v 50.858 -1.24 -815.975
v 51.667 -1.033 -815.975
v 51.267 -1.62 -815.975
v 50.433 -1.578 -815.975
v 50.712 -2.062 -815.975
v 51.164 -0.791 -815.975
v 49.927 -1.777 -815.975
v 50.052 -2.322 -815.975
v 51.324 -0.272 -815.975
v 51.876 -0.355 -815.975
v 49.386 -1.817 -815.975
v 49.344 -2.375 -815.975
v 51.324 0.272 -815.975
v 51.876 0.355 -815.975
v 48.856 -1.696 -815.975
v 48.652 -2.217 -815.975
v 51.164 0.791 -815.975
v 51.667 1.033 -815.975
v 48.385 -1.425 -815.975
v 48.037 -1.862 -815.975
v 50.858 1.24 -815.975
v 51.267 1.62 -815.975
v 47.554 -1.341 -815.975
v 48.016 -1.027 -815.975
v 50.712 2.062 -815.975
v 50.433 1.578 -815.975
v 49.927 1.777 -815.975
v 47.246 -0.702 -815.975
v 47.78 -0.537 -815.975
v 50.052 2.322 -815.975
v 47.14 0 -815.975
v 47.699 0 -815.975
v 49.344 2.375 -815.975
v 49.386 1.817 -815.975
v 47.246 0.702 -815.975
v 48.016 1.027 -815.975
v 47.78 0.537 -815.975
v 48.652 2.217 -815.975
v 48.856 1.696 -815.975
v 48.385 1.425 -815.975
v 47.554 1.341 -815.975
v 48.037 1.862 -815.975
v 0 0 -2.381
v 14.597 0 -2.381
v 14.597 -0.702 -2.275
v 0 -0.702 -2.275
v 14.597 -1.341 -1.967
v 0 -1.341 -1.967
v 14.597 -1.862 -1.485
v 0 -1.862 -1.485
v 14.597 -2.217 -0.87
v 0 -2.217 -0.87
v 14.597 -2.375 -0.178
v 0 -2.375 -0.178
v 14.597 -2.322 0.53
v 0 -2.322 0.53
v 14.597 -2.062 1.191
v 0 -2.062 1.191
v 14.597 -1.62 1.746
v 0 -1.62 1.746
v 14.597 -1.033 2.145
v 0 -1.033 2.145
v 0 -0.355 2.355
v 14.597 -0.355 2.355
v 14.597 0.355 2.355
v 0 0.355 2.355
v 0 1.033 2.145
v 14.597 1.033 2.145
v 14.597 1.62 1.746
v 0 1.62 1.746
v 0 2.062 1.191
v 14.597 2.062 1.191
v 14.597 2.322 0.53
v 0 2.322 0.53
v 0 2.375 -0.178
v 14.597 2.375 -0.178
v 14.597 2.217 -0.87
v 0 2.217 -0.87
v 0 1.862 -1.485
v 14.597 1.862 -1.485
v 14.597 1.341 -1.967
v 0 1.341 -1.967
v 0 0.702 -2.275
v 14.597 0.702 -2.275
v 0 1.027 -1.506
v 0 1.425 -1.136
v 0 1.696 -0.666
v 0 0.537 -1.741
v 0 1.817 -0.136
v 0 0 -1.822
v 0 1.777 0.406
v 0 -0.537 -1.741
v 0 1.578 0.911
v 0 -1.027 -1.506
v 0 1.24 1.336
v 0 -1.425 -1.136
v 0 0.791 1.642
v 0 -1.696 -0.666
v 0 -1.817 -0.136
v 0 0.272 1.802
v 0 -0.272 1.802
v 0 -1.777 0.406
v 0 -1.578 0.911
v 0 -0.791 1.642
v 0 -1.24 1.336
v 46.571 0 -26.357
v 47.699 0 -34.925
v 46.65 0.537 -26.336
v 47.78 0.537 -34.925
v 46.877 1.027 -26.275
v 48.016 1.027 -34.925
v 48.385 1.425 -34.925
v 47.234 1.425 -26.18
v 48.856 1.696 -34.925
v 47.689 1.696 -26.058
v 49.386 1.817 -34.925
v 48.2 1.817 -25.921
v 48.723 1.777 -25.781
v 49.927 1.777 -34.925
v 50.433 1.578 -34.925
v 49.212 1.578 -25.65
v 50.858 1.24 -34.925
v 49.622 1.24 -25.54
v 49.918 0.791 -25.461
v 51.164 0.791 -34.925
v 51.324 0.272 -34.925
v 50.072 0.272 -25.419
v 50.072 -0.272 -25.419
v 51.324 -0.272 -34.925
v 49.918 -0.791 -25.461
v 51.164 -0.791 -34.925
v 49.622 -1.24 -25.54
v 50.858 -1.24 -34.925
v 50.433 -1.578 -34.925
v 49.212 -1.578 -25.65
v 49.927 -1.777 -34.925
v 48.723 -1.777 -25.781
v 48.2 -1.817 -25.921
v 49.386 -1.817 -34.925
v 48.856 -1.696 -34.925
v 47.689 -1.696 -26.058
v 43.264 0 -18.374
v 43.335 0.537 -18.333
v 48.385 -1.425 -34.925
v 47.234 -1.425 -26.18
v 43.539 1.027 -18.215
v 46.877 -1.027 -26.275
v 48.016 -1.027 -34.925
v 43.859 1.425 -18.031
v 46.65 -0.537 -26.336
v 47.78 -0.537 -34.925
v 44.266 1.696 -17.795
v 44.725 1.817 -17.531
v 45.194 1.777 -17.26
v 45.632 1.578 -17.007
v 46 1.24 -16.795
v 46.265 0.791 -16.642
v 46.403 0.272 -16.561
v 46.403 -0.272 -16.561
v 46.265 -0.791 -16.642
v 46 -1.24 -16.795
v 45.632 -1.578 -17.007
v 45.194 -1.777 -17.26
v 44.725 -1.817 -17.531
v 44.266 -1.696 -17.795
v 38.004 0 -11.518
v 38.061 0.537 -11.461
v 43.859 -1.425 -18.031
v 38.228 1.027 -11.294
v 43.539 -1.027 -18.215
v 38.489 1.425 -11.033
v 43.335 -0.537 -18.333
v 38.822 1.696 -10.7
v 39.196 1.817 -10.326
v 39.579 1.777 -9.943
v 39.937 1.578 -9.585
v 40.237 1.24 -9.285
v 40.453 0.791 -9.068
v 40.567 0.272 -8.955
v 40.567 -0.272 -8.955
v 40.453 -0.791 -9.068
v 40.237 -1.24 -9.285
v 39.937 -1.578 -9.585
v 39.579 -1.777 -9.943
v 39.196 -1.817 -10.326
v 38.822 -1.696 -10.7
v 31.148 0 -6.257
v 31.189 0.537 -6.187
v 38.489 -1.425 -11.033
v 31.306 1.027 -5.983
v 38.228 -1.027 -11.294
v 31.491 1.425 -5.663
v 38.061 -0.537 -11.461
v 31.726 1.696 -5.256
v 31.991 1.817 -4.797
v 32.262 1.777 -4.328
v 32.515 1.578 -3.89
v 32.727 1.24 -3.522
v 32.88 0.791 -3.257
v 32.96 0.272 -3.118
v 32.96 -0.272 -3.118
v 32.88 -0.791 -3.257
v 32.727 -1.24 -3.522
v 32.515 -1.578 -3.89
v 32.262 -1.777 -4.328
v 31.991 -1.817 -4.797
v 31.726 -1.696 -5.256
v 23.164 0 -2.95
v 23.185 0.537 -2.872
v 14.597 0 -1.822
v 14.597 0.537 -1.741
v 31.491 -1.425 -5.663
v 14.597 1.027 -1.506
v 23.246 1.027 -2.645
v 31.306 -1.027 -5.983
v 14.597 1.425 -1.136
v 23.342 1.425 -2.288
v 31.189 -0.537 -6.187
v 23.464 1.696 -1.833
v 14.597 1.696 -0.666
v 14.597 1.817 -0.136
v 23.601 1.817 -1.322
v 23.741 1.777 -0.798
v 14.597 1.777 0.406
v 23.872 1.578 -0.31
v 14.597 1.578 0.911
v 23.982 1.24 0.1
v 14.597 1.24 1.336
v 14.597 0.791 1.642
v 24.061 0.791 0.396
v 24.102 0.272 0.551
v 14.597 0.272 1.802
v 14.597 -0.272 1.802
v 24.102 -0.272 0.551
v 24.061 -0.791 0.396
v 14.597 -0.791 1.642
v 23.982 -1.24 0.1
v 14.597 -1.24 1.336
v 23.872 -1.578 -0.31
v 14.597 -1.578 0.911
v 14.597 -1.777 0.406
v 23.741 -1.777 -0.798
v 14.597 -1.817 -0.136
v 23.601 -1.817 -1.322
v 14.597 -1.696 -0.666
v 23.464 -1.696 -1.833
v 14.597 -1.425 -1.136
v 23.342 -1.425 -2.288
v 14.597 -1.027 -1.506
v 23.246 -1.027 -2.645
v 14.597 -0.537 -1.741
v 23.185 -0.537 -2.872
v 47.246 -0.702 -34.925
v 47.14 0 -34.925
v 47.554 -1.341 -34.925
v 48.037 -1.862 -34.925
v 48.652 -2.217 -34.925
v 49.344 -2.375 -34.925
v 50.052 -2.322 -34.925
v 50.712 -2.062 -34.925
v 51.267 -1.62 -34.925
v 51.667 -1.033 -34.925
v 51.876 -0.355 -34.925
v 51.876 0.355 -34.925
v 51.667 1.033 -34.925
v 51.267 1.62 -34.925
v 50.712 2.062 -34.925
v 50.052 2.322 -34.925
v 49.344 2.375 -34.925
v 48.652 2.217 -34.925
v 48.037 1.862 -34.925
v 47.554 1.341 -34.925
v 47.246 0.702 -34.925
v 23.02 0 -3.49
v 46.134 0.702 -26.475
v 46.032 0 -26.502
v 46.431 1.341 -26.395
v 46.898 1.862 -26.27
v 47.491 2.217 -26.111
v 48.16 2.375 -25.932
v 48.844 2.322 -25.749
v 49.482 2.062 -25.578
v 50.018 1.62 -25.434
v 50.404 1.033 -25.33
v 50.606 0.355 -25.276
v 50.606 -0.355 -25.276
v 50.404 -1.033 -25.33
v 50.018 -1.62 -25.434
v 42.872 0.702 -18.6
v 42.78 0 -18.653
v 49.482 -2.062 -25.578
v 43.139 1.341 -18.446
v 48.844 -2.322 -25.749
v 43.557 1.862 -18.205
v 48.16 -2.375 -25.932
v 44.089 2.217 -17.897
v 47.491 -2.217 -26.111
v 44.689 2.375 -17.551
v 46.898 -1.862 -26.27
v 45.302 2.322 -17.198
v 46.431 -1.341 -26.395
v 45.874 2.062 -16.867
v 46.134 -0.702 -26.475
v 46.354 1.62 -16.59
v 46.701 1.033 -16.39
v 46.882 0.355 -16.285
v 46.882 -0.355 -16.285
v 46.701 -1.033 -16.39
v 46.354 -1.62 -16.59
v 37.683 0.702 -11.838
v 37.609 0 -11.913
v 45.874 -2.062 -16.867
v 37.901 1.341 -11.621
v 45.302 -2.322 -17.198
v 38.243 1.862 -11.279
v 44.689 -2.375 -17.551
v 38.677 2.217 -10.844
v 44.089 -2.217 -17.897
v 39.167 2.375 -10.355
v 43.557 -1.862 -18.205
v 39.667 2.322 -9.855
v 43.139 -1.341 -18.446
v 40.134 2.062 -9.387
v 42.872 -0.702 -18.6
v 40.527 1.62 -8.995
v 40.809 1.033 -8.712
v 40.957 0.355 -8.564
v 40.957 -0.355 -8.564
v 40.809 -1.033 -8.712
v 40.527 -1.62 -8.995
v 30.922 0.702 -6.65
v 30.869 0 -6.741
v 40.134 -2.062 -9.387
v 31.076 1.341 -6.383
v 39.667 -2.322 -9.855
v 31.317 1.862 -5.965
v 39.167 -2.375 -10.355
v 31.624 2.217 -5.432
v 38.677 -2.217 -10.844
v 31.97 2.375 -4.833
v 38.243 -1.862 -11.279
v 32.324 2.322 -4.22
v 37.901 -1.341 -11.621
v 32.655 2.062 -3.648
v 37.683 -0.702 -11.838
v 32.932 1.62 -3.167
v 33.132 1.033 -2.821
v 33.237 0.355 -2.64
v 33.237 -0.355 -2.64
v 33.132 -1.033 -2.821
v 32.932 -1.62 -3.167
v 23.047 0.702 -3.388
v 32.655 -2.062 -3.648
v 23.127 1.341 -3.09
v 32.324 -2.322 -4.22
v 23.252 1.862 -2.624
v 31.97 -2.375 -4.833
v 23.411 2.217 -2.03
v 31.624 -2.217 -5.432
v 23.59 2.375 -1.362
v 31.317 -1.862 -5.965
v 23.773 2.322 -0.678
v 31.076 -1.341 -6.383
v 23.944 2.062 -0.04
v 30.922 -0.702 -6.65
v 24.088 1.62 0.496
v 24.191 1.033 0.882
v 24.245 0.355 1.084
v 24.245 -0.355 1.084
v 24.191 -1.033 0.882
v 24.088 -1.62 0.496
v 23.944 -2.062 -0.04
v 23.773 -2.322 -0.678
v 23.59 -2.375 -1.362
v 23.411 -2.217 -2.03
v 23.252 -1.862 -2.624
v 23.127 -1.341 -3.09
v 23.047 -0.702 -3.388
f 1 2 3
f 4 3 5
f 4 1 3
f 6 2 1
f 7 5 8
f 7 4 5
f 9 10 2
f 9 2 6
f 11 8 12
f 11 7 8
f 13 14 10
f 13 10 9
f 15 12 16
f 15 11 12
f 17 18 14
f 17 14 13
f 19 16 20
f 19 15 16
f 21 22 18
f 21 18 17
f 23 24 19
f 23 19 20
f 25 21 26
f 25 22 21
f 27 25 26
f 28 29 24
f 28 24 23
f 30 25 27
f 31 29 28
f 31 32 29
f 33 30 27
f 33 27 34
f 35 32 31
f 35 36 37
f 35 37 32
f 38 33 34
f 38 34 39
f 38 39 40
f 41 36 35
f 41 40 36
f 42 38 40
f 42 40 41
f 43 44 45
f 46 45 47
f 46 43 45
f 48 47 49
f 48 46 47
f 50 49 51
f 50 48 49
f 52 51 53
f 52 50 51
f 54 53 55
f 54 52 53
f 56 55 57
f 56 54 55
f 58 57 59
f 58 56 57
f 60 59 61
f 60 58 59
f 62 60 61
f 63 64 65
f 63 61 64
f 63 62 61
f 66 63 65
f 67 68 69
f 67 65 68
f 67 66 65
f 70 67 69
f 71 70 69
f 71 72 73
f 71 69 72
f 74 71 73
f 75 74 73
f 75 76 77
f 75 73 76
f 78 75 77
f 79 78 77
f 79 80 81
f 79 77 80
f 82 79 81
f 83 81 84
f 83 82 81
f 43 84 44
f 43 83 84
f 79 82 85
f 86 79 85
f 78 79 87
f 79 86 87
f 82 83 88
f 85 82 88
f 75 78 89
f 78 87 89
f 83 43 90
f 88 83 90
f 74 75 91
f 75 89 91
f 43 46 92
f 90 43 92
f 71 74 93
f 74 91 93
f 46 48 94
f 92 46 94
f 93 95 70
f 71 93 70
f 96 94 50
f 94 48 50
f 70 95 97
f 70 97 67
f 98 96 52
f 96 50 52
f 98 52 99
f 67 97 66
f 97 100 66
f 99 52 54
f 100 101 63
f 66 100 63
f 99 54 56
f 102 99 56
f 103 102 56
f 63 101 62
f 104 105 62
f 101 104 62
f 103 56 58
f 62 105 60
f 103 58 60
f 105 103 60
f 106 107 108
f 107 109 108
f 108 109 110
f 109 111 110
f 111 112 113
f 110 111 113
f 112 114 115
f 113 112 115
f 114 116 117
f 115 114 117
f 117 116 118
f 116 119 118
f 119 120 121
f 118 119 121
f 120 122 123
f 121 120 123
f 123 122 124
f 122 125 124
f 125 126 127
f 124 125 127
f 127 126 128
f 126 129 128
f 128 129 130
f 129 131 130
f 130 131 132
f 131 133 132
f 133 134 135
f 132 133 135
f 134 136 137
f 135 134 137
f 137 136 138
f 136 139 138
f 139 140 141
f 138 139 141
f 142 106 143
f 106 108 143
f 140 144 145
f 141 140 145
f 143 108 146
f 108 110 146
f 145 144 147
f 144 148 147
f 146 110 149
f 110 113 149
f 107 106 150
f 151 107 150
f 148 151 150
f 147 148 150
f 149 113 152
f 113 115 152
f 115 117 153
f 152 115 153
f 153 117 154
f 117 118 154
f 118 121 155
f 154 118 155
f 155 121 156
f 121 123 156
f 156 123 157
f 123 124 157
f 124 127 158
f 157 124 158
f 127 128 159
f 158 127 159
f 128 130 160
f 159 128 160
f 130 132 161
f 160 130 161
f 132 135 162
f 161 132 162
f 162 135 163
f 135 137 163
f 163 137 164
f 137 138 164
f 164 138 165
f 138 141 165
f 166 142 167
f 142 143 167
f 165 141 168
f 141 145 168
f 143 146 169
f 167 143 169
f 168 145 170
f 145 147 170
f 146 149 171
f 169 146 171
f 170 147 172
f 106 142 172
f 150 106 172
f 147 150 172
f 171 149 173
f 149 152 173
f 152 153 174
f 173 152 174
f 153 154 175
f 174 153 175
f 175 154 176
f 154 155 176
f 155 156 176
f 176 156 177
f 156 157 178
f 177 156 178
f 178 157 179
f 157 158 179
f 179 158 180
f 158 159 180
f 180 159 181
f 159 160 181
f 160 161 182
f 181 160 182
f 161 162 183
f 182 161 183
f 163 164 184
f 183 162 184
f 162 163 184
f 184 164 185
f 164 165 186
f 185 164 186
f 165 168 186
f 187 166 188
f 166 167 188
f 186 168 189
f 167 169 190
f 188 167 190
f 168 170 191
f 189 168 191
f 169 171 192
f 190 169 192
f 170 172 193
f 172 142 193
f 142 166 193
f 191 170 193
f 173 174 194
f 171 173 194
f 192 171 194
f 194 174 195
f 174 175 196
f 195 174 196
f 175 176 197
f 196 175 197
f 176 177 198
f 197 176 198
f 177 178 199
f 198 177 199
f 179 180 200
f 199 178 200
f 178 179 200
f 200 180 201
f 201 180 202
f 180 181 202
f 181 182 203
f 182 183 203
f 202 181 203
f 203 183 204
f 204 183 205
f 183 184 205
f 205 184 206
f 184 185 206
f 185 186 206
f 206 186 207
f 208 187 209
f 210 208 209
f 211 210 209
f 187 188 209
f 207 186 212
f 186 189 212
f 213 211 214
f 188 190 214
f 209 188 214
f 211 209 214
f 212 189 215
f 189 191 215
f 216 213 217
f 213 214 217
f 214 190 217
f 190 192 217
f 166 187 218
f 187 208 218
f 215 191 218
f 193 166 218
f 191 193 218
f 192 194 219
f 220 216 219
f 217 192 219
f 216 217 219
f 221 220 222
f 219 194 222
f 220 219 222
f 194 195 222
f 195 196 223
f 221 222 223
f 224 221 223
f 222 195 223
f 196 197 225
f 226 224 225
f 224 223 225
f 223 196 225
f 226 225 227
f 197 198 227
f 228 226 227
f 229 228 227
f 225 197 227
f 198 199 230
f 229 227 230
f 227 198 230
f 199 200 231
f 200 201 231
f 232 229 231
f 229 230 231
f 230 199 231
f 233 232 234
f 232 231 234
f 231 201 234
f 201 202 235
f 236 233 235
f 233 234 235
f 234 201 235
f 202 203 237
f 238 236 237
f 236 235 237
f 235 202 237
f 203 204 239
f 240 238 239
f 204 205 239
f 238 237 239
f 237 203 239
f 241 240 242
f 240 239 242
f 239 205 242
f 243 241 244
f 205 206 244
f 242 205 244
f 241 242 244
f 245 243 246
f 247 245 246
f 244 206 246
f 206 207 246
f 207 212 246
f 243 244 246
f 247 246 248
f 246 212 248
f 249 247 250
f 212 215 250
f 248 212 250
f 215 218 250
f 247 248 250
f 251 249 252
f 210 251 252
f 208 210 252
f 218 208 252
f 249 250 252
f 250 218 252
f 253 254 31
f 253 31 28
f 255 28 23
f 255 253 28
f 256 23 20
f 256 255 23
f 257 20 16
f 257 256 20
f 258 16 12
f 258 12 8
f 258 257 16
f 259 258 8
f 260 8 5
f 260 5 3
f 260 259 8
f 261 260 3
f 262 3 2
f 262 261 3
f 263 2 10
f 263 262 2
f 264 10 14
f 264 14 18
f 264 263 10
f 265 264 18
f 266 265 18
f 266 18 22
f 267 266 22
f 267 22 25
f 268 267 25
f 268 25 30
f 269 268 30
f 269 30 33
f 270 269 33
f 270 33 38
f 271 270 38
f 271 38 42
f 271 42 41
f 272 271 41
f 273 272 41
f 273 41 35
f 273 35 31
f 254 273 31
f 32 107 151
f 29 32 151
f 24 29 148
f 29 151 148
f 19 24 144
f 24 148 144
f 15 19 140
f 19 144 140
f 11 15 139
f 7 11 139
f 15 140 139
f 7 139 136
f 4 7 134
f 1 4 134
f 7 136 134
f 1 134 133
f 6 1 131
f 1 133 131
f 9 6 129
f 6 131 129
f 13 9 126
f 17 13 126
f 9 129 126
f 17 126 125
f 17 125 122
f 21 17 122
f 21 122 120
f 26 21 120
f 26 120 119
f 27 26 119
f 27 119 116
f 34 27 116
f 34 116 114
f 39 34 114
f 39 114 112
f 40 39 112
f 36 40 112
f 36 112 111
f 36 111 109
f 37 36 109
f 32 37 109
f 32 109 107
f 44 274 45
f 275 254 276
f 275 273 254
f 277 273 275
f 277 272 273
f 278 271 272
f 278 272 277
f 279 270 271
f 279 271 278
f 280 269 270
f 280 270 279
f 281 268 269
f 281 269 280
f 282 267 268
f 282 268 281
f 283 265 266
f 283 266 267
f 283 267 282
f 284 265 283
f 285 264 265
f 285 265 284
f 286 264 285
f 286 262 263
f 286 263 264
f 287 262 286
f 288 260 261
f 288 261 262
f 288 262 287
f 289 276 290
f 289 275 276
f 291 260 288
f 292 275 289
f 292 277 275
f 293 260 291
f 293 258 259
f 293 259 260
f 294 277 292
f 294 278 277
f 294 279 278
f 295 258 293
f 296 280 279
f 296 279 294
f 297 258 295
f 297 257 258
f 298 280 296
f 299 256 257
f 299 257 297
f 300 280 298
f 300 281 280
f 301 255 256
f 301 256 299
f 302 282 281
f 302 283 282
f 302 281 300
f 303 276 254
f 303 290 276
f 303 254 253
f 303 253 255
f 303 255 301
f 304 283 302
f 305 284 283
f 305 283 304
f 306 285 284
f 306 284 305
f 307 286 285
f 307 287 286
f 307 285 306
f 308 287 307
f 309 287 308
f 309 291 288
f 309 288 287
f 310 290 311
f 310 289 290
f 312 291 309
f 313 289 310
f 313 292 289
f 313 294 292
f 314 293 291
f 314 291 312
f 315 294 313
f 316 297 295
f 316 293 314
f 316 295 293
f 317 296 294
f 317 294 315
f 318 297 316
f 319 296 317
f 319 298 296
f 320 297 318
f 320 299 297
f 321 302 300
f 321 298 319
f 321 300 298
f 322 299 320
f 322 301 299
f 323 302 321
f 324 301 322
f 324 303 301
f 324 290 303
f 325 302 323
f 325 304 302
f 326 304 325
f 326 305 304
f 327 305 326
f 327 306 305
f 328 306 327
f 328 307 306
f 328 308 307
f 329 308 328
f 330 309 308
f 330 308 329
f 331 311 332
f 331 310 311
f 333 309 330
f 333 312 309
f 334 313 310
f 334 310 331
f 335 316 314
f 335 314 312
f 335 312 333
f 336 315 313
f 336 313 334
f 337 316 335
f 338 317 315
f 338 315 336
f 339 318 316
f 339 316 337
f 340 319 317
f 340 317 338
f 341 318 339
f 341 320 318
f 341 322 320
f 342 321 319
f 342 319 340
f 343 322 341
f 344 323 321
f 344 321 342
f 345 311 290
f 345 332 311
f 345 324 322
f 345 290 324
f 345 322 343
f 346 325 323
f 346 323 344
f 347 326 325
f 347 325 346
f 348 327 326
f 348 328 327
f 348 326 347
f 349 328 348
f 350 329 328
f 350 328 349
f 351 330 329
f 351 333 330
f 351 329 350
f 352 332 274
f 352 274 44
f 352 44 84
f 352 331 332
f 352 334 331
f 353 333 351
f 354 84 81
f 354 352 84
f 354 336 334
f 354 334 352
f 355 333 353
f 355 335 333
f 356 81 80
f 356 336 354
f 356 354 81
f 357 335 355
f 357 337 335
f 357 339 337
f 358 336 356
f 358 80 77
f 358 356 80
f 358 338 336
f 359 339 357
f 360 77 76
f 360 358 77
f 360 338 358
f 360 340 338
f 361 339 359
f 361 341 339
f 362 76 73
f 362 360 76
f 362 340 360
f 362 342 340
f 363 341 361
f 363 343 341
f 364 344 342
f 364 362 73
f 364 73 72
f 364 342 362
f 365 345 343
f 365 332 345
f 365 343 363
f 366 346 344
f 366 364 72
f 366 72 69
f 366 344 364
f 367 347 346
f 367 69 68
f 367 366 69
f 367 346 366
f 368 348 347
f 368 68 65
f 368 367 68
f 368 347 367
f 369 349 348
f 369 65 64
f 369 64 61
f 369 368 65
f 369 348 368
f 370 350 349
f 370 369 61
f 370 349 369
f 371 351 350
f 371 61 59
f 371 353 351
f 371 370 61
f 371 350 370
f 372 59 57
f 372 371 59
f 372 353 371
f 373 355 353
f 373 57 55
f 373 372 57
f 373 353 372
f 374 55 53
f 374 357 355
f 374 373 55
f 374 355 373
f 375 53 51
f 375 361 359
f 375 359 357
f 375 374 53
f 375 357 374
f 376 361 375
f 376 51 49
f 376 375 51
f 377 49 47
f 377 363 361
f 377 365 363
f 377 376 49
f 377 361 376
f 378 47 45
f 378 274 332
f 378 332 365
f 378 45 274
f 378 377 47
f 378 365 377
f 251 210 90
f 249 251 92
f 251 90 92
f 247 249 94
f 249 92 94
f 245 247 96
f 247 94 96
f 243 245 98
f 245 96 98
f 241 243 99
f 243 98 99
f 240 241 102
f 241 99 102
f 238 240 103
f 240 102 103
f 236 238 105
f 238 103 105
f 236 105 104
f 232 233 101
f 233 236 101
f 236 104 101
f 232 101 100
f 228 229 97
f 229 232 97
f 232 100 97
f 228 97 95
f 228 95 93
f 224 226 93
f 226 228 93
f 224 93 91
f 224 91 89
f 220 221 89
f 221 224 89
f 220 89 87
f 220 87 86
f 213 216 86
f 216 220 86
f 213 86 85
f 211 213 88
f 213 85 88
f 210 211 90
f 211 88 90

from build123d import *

# Parameters (mm, degrees)
SKETCH2_R   = 2.38125
SKETCH2_R_2 = 1.82245


with BuildPart() as part:
    # Sweep1: sweep along a path in Sketch1
    with BuildLine(Plane(origin=(0, 0, 0), x_dir=(1, 0, 0), z_dir=(0, 1, 0))) as sweep1_path:
        Line((49.521745, 815.975), (49.521745, 34.925))
        ThreePointArc((49.521745, 34.925), (39.292449333, 10.229295667), (14.596745, 0))
        Line((14.596745, 0), (0, 0))
    # Sketch2 → Sweep1 (sweep)
    with BuildSketch(Plane(origin=(0, 0, 0), x_dir=(0, 0, -1), z_dir=(1, 0, 0))):
        Circle(SKETCH2_R)
        Circle(SKETCH2_R_2, mode=Mode.SUBTRACT)
    sweep(path=sweep1_path.line)


solid = part.part
